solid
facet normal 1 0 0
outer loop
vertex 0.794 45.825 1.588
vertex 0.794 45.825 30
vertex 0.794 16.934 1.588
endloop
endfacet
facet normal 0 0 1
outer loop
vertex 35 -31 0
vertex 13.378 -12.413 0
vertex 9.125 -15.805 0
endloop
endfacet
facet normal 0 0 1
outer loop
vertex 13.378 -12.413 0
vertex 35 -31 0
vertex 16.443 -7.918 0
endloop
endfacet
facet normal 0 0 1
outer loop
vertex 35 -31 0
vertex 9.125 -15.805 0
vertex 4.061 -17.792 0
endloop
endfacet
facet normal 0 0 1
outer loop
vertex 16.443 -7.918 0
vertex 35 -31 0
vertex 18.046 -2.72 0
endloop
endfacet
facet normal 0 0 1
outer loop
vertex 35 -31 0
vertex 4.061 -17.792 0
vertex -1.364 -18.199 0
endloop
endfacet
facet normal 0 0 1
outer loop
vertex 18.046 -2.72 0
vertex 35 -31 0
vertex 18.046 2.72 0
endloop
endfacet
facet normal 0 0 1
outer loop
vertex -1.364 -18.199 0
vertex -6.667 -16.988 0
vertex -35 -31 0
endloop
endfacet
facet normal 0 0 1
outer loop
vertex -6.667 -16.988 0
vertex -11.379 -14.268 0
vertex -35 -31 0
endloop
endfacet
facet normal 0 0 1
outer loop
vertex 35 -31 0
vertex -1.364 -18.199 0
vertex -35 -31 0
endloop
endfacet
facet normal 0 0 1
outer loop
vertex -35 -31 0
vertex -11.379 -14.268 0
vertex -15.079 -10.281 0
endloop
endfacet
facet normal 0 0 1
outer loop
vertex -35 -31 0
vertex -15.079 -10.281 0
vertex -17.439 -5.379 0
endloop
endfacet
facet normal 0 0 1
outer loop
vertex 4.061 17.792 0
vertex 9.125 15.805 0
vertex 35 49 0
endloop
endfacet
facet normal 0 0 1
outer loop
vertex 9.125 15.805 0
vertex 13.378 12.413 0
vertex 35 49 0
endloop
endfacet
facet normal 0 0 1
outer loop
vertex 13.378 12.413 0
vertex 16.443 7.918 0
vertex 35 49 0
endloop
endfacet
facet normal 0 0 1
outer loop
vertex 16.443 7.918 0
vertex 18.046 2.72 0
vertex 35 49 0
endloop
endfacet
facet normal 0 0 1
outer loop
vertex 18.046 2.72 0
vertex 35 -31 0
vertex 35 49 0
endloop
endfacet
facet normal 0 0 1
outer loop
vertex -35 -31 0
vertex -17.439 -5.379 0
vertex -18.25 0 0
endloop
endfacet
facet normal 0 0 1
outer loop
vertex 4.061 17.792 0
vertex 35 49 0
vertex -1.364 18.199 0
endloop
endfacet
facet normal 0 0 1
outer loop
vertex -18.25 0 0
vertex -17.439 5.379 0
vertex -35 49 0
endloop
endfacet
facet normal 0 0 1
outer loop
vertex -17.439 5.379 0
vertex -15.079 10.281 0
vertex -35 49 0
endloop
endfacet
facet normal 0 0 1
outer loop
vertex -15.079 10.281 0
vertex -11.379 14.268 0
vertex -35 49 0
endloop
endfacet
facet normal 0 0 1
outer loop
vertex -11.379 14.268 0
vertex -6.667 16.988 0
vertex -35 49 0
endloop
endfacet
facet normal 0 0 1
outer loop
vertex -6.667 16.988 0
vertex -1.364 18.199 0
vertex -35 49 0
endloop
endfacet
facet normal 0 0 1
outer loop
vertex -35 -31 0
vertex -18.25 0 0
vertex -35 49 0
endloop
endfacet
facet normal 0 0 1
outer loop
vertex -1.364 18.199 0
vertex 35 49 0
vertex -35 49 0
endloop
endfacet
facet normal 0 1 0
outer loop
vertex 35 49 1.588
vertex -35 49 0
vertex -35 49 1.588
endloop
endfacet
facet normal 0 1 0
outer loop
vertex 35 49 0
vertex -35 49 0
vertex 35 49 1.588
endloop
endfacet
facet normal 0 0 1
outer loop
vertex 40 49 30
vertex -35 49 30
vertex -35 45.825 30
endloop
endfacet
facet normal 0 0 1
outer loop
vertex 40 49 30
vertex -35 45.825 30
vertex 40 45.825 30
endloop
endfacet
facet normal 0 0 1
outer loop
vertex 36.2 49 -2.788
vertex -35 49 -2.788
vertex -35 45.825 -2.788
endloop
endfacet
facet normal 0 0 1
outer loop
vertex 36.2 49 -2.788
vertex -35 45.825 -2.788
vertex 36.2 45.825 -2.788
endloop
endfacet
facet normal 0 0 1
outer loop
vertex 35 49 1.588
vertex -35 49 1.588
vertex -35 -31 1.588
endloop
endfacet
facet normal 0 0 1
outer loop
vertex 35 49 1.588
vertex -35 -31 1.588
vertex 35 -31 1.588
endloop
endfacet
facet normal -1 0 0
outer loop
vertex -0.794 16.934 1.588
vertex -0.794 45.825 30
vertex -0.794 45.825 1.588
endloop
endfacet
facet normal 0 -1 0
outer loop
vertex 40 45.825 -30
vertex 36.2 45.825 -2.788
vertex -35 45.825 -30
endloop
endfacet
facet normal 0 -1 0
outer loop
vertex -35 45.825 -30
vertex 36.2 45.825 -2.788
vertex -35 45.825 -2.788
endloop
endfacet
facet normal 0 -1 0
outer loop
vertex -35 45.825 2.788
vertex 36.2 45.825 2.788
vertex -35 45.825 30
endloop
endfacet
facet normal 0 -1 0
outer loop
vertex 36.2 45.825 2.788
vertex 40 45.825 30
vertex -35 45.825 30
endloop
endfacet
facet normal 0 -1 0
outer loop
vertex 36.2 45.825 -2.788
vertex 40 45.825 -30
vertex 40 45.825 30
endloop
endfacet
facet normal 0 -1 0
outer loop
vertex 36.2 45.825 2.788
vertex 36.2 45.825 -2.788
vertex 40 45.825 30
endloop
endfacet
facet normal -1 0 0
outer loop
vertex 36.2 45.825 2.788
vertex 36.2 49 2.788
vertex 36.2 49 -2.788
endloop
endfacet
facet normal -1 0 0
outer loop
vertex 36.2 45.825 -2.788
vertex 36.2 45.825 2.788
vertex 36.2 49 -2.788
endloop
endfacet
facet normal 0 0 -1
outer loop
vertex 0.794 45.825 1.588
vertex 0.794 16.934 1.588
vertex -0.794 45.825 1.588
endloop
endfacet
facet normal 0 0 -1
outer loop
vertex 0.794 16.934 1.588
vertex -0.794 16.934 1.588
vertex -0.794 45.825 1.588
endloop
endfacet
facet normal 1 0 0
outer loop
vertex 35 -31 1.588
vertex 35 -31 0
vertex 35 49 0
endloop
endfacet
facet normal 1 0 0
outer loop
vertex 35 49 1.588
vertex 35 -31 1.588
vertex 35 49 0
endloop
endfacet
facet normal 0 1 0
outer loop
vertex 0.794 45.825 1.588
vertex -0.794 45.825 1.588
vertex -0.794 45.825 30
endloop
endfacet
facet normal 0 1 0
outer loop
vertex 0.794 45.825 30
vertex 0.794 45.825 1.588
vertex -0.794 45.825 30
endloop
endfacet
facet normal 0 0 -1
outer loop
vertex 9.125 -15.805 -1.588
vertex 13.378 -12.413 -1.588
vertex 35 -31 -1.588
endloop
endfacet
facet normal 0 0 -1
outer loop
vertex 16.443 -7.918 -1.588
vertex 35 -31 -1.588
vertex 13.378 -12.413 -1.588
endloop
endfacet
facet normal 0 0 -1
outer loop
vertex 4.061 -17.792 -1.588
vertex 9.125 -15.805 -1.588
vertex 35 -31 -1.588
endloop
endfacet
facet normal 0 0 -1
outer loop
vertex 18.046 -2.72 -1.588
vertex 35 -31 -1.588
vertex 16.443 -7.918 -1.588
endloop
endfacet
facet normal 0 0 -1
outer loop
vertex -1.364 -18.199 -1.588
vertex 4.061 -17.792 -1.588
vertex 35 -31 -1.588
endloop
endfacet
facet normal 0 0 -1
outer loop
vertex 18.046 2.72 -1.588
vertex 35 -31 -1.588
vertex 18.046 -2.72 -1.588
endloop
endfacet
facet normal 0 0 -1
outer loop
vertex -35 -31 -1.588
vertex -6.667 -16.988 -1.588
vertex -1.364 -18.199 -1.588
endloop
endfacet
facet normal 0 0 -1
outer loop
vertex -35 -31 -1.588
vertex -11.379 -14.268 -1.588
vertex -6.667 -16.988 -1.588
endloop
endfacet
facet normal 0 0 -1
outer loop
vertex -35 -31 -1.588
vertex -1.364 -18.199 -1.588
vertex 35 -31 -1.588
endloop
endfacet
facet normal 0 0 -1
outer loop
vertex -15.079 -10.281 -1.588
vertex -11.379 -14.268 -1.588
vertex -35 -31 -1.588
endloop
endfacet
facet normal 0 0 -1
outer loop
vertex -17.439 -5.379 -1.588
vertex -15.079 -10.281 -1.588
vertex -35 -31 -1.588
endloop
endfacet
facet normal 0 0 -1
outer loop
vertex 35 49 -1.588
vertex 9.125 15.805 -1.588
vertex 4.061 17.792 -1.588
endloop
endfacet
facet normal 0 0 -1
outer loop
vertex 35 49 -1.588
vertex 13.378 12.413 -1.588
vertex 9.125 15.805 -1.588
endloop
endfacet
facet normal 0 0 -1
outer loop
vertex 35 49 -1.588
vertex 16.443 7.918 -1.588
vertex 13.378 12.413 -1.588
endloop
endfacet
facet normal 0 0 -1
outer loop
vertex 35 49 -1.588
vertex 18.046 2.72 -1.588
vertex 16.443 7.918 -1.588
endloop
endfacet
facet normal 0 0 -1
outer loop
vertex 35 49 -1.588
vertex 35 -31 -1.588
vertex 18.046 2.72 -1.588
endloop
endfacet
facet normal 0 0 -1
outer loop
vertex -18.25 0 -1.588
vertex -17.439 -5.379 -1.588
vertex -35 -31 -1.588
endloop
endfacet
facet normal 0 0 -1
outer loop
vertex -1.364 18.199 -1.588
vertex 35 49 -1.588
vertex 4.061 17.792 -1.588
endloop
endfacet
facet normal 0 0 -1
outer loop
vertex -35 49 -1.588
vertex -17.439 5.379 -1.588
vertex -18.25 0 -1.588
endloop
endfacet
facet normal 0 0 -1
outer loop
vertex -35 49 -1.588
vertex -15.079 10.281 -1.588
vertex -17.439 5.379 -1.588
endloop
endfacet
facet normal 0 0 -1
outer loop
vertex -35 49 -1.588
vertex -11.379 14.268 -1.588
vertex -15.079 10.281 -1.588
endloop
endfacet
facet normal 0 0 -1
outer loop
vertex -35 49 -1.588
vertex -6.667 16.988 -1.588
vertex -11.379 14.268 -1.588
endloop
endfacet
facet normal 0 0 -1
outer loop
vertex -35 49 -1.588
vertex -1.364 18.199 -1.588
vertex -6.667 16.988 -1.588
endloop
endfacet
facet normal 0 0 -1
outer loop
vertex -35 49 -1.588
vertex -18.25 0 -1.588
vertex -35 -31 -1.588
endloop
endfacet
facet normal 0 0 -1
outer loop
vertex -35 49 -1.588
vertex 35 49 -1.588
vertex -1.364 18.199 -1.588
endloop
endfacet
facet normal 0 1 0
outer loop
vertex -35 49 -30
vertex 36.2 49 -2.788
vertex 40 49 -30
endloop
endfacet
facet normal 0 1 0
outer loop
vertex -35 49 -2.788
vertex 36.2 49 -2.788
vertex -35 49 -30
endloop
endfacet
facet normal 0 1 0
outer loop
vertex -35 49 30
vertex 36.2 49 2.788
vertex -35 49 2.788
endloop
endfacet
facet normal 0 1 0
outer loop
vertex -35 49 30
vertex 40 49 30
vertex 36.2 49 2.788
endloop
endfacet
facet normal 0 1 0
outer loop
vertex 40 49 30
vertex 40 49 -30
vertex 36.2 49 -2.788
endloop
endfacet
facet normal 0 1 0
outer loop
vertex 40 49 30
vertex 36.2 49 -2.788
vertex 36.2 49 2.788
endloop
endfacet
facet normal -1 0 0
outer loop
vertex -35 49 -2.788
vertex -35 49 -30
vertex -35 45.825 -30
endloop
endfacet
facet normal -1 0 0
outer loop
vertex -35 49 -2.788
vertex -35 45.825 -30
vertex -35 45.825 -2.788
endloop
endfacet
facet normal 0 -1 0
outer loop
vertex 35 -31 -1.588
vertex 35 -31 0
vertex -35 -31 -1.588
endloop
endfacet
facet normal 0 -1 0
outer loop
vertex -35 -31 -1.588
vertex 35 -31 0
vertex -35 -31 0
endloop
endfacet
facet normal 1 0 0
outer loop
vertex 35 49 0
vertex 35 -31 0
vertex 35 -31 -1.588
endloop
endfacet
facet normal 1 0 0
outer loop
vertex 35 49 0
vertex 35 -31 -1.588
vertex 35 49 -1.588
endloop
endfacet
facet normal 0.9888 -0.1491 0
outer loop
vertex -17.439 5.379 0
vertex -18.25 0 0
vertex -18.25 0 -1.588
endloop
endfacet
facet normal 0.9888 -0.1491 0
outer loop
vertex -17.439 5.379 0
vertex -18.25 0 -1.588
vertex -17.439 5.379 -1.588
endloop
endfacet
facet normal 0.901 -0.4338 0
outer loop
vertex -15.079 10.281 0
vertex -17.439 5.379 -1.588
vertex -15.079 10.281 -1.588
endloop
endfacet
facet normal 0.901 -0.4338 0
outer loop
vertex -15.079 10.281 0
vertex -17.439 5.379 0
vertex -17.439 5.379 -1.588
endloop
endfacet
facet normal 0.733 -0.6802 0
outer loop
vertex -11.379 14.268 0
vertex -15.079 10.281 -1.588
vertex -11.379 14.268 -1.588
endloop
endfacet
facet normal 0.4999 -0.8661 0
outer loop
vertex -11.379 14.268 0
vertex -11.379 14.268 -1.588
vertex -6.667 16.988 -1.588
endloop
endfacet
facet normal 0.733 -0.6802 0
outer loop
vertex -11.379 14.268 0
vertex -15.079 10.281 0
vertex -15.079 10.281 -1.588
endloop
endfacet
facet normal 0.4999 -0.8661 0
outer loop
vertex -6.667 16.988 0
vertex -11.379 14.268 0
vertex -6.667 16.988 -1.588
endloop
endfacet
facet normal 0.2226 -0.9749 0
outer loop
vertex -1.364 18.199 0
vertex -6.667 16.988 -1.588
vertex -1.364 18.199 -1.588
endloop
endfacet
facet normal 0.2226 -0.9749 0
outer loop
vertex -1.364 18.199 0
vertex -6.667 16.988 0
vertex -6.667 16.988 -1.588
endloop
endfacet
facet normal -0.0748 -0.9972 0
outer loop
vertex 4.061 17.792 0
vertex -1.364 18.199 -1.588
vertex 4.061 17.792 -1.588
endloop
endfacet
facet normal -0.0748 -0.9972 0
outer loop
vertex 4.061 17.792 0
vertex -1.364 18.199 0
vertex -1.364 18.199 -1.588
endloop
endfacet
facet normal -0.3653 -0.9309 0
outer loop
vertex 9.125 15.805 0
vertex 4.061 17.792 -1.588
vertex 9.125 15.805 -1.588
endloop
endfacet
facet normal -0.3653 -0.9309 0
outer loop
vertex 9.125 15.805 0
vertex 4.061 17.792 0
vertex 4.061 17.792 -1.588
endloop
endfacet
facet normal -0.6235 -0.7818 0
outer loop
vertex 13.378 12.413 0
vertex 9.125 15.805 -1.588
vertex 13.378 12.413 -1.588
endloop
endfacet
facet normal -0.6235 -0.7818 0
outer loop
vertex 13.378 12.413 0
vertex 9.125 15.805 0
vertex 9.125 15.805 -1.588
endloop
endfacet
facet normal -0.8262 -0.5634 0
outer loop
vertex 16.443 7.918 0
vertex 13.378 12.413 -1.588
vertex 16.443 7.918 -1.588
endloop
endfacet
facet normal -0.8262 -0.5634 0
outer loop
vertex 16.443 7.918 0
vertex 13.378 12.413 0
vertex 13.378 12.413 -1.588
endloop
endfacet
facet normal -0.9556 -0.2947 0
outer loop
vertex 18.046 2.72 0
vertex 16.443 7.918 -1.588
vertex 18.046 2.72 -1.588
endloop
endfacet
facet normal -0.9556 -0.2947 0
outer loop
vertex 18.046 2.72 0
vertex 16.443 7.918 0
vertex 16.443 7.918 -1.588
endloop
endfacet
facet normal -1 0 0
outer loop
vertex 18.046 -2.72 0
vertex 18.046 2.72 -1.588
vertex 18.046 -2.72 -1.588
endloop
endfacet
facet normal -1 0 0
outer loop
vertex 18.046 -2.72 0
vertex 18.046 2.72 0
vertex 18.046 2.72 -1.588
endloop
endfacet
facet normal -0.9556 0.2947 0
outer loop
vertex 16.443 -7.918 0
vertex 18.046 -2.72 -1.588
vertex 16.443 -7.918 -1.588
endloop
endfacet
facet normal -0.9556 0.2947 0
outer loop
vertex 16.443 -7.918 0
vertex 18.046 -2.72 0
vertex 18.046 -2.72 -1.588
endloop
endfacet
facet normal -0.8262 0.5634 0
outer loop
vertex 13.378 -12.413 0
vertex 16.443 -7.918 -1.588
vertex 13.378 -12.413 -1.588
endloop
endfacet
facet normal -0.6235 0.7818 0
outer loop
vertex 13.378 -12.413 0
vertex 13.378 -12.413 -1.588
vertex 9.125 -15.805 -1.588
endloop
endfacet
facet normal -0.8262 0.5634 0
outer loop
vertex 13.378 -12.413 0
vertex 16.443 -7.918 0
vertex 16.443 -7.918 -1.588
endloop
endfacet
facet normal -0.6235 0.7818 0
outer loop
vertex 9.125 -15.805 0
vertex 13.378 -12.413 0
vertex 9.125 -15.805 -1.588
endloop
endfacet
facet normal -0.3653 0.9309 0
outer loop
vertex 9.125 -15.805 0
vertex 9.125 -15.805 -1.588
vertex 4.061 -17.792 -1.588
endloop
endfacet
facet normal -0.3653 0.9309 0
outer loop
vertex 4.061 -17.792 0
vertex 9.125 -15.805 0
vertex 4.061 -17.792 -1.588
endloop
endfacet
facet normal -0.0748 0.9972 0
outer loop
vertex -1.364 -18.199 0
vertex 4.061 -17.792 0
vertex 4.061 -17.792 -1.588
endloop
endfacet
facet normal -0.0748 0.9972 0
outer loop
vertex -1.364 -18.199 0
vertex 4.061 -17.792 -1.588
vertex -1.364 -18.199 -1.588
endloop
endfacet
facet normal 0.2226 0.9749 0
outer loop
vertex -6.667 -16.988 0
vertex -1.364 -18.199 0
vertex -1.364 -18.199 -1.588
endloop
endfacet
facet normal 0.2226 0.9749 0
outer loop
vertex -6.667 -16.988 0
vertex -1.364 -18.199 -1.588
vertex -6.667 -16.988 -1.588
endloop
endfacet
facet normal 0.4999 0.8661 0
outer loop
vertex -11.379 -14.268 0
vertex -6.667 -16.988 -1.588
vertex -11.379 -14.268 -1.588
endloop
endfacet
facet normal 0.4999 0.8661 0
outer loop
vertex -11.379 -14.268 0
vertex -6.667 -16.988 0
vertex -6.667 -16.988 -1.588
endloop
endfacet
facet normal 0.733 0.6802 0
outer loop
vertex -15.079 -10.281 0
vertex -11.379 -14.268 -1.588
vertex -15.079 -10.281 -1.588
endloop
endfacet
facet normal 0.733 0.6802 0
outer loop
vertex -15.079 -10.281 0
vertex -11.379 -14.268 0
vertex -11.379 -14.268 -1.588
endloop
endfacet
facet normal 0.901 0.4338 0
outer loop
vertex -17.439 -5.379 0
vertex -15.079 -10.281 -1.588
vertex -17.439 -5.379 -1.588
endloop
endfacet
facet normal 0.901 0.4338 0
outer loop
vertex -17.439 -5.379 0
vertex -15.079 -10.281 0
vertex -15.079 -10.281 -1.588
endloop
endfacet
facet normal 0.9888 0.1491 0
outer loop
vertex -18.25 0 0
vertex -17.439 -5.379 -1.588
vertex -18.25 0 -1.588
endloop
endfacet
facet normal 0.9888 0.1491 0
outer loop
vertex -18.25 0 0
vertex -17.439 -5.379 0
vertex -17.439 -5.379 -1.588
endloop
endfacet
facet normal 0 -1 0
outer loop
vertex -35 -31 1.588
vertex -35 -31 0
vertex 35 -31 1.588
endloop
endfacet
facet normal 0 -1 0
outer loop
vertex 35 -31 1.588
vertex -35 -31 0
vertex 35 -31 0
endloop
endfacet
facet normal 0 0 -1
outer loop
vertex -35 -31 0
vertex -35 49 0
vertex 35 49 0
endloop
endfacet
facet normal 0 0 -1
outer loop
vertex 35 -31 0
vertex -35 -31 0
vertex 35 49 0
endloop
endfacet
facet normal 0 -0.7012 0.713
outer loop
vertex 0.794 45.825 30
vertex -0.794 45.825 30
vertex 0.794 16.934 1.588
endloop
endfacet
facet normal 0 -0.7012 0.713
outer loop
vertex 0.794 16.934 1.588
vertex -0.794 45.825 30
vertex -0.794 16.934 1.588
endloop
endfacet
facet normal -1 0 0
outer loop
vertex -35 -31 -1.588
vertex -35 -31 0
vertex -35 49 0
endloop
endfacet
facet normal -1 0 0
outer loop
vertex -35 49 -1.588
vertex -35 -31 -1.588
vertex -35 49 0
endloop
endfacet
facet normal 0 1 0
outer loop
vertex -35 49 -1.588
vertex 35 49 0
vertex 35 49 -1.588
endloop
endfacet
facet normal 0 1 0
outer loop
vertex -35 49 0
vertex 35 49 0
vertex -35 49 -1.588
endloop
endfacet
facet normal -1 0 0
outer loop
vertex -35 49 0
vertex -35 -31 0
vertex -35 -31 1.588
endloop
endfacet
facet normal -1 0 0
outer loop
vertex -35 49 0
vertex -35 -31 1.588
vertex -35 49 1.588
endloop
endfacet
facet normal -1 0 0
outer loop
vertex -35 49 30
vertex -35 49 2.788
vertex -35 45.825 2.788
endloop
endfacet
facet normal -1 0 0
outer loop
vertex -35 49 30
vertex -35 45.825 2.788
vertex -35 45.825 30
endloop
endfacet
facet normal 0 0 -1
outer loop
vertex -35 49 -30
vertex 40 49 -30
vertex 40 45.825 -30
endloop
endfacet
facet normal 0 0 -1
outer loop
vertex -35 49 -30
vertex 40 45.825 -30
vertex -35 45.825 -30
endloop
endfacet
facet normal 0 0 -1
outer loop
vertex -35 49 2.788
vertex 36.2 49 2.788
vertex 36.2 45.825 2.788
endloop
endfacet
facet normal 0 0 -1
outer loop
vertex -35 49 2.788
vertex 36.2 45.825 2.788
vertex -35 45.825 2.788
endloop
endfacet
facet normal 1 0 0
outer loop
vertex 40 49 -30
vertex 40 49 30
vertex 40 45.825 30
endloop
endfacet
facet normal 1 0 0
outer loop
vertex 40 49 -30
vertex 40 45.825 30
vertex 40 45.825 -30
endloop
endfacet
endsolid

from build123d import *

# Parameters (mm, degrees)
SKETCH1_W           = 70
SKETCH1_H           = 80
BOSS_EXTRUDE1_DEPTH = 1.5875
SKETCH2_W           = 70
SKETCH2_H           = 80
SKETCH2_R           = 18.25
BOSS_EXTRUDE2_DEPTH = 1.5875
BOSS_EXTRUDE3_DEPTH = 3.175
BOSS_EXTRUDE4_DEPTH = 0.79375


with BuildPart() as part:
    # Sketch1 → Boss-Extrude1 (new body)
    with BuildSketch(Plane.XY):
        with Locations((0, 9)):
            Rectangle(SKETCH1_W, SKETCH1_H)
    extrude(amount=BOSS_EXTRUDE1_DEPTH)


with BuildPart() as body_2:
    # Sketch2 → Boss-Extrude2 (new body)
    with BuildSketch(Plane(origin=(0, 0, 0), x_dir=(-1, 0, 0), z_dir=(0, 0, -1))):
        with Locations((0, 9)):
            Rectangle(SKETCH2_W, SKETCH2_H)
        Circle(SKETCH2_R, mode=Mode.SUBTRACT)
    extrude(amount=BOSS_EXTRUDE2_DEPTH)


with BuildPart() as body_3:
    # Sketch3 → Boss-Extrude3 (new body)
    with BuildSketch(Plane.XZ.offset(-49)):
        Polygon((-35, 30), (40, 30), (40, -30), (-35, -30), (-35, -2.7875), (36.2, -2.7875), (36.2, 0), (36.2, 2.7875), (-35, 2.7875), align=None)
    extrude(amount=BOSS_EXTRUDE3_DEPTH)


with BuildPart() as body_4:
    # Sketch5 → Boss-Extrude4 (new body, symmetric)
    with BuildSketch(Plane.ZY):
        Polygon((30, 45.825), (1.5875, 16.934174077), (1.5875, 45.825), align=None)
    extrude(amount=BOSS_EXTRUDE4_DEPTH, both=True)


solid = Compound([part.part, body_2.part, body_3.part, body_4.part])
